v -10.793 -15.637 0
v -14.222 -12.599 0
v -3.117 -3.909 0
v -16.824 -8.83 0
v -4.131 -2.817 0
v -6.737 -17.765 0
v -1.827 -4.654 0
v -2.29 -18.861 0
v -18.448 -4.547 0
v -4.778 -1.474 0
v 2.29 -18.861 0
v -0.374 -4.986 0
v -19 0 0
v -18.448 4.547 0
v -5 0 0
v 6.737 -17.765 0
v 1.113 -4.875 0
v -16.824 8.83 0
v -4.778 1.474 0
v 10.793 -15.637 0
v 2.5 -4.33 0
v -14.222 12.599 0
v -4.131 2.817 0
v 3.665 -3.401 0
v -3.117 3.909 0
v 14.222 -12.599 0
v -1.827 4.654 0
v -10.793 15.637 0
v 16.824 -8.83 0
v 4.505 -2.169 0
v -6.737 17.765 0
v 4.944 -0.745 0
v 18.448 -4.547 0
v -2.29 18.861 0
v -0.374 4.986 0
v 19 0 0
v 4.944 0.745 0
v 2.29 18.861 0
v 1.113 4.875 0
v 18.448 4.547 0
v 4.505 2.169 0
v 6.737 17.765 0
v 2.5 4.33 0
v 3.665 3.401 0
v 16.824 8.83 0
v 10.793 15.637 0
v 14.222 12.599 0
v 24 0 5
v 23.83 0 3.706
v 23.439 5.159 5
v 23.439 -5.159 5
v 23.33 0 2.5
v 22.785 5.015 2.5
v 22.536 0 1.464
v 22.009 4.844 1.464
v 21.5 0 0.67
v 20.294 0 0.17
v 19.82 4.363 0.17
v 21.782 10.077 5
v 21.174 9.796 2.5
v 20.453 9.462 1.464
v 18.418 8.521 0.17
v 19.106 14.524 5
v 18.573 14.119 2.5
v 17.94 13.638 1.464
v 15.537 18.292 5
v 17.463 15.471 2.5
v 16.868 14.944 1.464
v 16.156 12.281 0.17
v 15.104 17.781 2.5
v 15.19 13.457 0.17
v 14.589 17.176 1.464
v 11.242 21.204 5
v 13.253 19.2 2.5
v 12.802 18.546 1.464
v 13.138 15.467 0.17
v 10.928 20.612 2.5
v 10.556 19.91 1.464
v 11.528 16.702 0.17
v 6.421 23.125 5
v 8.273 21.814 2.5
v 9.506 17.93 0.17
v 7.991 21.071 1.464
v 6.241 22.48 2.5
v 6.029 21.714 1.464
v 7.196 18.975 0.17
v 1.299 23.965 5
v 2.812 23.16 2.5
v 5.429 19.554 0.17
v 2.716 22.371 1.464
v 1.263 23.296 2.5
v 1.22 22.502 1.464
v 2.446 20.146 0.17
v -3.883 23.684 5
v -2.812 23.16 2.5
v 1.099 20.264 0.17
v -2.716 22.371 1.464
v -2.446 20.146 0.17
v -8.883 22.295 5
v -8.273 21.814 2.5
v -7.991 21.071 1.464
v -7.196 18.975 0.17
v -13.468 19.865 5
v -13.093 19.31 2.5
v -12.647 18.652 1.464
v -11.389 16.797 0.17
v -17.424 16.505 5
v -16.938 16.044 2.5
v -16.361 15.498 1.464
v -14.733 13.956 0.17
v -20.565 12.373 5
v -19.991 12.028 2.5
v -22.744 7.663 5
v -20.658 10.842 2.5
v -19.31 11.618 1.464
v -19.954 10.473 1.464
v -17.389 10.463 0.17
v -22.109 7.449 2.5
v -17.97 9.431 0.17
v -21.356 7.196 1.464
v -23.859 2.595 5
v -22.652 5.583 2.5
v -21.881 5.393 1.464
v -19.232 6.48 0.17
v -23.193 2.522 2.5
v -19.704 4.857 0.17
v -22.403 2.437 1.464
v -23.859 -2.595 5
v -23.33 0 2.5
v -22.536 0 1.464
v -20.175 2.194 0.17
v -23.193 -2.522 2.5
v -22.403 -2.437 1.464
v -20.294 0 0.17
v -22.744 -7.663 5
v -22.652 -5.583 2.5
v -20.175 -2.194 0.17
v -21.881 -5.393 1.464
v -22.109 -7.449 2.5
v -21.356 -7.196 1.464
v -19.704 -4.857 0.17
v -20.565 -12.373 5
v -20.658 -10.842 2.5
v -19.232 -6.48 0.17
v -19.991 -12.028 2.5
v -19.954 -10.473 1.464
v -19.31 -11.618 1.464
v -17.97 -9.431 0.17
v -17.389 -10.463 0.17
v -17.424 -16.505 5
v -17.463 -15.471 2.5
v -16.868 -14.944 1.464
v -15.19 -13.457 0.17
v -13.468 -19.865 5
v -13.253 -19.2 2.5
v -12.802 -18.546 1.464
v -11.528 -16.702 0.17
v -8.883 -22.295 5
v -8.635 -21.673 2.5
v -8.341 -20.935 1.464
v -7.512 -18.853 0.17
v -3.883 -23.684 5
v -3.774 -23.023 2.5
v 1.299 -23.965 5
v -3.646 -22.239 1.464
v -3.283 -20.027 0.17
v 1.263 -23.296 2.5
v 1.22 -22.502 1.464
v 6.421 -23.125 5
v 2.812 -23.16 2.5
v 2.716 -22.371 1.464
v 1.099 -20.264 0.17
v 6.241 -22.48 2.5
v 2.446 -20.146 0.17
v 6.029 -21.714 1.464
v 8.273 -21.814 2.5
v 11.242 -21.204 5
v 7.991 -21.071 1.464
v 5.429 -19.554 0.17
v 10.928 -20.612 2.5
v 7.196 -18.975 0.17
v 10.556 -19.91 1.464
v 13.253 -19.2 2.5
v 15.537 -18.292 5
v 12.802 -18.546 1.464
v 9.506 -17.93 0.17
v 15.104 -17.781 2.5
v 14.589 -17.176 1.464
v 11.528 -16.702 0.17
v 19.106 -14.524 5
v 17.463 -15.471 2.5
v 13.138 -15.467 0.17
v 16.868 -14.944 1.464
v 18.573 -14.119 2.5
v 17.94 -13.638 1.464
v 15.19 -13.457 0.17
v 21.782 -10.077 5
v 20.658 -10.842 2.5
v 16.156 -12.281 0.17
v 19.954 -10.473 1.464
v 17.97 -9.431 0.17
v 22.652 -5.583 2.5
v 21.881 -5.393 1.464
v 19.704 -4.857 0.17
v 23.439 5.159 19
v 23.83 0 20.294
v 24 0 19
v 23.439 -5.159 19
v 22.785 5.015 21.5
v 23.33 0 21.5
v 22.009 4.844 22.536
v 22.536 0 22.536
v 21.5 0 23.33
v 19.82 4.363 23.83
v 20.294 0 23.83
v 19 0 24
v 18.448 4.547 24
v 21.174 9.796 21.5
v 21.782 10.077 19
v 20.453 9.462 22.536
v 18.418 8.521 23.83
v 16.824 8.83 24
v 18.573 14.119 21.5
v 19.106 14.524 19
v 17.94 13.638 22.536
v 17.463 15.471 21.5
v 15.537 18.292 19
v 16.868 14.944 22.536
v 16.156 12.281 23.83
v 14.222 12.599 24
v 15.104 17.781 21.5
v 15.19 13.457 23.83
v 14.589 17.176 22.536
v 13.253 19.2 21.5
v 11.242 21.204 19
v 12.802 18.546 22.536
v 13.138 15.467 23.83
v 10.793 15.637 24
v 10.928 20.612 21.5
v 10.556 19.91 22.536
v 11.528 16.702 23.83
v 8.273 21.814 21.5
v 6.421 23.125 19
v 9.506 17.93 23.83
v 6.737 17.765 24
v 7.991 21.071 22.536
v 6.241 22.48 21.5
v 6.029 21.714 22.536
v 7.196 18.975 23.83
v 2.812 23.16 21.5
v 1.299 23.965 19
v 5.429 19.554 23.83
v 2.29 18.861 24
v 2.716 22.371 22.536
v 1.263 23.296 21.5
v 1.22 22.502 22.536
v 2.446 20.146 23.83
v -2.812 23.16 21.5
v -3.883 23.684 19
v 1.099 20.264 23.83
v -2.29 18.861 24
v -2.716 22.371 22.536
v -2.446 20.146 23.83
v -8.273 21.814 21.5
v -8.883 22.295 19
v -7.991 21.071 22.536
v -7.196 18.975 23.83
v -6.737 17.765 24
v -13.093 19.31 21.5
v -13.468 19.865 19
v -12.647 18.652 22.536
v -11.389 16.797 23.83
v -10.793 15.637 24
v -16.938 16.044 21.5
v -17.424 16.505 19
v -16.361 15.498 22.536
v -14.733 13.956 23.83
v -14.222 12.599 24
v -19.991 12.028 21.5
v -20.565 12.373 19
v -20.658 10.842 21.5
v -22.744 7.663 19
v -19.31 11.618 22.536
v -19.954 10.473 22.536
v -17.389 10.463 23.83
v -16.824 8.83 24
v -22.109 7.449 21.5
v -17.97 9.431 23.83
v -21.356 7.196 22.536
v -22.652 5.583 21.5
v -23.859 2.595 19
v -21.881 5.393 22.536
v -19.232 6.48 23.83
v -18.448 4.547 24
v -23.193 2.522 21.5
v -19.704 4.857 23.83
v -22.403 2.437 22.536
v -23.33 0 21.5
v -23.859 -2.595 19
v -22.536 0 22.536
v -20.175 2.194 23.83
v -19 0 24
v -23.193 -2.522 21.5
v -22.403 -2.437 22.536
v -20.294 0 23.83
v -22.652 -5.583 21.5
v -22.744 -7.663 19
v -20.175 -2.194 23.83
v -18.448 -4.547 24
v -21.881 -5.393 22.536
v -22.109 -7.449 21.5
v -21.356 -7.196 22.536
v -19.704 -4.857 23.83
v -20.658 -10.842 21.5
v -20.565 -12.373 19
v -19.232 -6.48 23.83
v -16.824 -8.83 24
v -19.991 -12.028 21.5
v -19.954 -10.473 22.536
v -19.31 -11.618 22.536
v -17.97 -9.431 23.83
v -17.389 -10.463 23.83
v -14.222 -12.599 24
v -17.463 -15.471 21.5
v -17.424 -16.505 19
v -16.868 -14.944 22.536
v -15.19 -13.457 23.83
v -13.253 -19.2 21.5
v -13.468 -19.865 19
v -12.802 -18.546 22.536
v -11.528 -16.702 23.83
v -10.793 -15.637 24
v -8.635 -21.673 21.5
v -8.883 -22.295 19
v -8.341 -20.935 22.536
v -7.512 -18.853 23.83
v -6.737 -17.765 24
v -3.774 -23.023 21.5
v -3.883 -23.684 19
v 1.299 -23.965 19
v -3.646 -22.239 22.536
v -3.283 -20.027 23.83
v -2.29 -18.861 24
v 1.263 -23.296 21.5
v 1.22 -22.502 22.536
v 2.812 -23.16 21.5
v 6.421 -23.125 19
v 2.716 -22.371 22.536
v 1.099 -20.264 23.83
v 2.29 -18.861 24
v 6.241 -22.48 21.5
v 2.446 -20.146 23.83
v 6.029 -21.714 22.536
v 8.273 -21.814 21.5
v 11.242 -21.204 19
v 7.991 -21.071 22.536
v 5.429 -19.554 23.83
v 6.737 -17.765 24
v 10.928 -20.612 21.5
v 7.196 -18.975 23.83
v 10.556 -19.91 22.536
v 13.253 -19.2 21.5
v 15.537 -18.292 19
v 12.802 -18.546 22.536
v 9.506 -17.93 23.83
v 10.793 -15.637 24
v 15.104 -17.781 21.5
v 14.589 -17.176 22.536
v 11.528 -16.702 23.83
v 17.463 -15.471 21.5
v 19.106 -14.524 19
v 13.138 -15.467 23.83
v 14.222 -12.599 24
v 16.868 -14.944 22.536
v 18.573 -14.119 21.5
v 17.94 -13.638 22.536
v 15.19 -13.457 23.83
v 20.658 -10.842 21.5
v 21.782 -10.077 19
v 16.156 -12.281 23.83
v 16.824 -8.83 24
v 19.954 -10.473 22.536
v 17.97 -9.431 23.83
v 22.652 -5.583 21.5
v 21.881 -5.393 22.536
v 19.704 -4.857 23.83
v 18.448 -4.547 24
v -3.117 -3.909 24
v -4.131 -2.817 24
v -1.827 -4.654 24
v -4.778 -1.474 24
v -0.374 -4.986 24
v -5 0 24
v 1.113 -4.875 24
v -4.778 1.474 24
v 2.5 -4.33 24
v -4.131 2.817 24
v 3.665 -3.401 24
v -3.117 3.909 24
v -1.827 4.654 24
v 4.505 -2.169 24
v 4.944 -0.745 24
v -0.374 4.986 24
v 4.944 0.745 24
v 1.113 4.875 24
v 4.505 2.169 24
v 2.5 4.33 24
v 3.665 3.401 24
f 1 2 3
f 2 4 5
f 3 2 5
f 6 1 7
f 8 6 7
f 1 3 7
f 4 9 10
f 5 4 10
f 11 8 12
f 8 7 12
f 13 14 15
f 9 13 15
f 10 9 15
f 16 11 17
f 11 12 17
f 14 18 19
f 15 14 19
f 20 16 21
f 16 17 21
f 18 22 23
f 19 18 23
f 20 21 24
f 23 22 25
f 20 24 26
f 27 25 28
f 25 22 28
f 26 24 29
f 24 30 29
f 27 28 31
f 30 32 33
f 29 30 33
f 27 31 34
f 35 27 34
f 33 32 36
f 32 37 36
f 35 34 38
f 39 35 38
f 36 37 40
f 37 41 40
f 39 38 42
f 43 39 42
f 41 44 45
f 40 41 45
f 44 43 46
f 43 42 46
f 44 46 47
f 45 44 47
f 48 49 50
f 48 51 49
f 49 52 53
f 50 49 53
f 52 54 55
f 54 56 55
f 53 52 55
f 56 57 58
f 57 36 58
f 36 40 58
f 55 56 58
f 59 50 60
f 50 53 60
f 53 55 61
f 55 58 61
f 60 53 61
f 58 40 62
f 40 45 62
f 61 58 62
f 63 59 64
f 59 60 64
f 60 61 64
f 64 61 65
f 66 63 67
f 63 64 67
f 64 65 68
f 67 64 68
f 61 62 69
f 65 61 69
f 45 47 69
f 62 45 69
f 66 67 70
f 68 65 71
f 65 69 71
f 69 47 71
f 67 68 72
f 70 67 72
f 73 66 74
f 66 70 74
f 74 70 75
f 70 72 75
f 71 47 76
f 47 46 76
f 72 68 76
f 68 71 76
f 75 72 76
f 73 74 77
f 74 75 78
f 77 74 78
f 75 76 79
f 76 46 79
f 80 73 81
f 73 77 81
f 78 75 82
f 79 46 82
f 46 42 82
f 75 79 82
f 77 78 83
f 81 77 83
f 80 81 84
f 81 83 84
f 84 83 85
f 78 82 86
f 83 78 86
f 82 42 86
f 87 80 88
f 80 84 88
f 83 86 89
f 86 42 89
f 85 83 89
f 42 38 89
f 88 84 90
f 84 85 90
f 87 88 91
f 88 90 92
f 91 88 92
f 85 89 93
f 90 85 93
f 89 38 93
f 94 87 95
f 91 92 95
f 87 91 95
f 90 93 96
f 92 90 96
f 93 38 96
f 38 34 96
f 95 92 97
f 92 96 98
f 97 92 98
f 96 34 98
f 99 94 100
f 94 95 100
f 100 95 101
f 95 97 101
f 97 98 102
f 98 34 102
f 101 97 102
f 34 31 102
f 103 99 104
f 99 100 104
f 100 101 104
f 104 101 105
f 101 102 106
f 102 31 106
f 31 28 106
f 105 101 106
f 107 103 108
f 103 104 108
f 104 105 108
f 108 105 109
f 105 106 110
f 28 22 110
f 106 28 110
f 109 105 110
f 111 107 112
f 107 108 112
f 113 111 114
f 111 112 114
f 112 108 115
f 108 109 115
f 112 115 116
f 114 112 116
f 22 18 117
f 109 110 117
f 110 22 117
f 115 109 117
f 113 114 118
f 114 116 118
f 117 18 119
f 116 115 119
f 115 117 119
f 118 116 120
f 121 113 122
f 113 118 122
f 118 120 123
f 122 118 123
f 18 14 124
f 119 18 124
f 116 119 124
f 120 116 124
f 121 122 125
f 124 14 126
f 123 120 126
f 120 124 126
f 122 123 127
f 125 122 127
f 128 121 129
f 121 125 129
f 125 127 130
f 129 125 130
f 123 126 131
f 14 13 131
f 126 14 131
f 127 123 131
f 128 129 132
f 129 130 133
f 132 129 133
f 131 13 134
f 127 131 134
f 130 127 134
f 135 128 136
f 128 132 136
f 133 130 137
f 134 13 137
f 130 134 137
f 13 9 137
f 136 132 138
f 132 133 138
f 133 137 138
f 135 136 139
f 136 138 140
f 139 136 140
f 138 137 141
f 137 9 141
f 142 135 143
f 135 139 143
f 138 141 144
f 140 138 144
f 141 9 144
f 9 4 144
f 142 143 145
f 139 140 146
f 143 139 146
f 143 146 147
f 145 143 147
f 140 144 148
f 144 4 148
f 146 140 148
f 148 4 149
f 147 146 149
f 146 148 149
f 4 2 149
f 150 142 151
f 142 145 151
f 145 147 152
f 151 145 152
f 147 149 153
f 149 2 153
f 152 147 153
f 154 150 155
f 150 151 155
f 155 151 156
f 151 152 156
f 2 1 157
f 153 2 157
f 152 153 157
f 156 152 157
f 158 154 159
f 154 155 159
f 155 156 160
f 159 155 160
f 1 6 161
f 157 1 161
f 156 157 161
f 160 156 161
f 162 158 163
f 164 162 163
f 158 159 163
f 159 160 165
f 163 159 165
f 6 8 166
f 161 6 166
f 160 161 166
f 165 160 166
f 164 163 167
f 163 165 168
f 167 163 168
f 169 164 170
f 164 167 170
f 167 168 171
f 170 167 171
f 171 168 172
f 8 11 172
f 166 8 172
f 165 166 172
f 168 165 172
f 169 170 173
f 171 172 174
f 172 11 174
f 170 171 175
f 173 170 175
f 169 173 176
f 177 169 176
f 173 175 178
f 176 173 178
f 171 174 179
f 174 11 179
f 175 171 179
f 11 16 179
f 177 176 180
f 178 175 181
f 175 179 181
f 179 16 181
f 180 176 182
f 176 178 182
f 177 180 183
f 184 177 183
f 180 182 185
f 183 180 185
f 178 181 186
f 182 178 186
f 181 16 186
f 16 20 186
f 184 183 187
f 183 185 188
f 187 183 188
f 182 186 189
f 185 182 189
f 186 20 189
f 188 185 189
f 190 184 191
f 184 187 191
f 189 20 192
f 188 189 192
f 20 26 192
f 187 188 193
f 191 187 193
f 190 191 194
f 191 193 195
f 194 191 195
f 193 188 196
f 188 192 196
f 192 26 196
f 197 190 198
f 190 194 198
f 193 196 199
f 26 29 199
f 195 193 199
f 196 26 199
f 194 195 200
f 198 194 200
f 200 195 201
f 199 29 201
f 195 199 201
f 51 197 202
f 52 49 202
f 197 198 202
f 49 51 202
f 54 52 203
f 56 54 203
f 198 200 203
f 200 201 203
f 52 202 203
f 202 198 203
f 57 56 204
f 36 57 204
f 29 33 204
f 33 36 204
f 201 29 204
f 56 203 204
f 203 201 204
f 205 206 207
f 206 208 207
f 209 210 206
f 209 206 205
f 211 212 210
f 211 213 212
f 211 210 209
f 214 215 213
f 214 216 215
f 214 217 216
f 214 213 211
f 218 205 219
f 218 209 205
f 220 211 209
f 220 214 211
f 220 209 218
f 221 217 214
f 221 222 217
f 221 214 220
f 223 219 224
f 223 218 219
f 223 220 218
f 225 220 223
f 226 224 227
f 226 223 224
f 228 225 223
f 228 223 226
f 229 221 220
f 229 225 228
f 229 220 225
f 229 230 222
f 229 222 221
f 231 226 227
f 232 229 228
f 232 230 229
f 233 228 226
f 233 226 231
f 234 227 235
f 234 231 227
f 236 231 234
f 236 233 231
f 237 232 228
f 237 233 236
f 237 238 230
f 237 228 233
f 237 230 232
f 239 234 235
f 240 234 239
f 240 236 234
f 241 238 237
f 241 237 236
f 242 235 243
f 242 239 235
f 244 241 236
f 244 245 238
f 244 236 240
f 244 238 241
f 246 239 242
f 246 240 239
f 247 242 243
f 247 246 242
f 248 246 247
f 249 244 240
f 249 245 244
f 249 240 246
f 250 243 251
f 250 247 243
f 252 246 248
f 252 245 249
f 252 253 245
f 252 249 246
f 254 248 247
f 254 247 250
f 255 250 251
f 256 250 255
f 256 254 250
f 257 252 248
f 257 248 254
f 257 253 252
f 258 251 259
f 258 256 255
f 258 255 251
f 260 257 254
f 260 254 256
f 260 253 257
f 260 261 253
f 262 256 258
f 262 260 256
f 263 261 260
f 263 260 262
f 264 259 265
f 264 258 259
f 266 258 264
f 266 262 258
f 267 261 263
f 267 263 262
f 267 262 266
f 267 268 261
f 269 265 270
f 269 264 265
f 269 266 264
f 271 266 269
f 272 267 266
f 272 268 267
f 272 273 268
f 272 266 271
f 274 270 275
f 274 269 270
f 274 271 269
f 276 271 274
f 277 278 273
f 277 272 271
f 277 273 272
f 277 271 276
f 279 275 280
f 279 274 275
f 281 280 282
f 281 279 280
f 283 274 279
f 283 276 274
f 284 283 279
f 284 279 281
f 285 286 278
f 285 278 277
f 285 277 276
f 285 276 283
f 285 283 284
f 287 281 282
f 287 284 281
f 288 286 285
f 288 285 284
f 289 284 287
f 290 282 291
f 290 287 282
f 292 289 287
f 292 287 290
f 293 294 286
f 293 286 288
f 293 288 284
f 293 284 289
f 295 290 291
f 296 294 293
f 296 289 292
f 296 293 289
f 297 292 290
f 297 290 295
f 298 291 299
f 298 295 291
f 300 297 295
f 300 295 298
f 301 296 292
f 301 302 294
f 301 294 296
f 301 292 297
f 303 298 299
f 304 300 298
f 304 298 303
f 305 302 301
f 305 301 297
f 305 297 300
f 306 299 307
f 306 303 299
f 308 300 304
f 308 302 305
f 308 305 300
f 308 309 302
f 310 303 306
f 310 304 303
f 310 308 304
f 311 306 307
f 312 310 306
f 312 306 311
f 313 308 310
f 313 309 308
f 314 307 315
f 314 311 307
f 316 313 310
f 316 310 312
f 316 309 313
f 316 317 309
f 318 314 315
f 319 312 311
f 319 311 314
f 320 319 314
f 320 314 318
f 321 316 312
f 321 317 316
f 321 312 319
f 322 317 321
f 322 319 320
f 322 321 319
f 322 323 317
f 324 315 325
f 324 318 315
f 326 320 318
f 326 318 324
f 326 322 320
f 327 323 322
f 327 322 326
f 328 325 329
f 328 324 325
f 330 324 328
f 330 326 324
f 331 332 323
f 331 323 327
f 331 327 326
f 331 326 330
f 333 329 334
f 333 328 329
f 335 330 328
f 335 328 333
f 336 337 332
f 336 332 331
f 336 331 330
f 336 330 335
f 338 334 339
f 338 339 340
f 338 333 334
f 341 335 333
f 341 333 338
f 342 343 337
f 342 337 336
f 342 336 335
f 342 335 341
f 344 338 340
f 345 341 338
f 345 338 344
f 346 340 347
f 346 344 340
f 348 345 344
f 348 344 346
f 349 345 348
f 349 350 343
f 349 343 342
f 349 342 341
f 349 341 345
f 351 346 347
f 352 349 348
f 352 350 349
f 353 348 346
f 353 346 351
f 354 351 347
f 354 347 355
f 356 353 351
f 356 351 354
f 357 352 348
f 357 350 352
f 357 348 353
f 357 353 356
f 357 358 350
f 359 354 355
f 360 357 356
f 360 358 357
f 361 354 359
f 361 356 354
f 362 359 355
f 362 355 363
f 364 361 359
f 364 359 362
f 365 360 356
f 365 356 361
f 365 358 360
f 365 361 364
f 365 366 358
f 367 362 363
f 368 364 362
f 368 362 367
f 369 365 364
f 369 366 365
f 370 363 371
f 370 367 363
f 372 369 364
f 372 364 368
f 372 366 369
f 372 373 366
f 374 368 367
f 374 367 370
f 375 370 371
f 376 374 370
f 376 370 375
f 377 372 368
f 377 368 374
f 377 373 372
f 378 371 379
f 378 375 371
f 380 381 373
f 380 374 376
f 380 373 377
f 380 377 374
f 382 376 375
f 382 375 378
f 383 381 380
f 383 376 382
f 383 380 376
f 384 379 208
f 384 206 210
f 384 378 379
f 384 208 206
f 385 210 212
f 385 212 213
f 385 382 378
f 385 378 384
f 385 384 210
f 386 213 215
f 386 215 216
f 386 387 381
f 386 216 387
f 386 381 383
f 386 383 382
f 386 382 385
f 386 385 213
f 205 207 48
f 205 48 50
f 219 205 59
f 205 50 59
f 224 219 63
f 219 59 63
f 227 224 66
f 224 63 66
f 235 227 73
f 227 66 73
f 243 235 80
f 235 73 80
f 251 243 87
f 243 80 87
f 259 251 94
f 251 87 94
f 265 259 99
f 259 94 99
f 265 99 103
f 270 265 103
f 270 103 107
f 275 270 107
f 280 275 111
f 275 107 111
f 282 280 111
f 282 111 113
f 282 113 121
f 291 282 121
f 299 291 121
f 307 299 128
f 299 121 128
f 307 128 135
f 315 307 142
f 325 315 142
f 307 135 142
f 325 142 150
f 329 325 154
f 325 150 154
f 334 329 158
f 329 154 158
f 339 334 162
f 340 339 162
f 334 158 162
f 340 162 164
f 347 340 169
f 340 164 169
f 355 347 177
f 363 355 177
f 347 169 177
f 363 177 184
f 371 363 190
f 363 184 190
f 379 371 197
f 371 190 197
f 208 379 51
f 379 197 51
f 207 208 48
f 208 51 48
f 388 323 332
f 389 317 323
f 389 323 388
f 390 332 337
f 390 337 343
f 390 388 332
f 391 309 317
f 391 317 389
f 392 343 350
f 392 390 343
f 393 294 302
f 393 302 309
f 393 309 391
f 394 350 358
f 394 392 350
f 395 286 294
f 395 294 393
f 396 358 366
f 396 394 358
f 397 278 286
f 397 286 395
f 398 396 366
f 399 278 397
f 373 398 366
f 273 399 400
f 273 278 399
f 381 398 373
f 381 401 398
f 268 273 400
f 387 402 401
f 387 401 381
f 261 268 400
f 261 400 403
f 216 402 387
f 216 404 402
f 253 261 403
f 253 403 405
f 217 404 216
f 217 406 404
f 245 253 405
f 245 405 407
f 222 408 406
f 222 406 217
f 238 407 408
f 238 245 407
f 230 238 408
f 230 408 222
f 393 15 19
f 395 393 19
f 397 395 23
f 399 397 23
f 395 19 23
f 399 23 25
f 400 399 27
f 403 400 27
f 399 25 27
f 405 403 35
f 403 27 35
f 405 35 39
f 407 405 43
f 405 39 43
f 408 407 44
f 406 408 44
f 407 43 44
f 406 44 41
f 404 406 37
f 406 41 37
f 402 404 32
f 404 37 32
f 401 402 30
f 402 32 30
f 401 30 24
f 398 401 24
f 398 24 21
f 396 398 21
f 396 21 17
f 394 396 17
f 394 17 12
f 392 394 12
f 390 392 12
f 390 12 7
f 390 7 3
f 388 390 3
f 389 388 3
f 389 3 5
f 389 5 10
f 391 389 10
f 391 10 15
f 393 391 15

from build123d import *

# Parameters (mm, degrees)
SKIZZE1_R                       = 24
AUFSATZ_LINEAR_AUSTRAGEN1_DEPTH = 24
VERRUNDUNG1_R                   = 5
SKIZZE2_R                       = 5
SCHNITT_LINEAR_AUSTRAGEN1_DEPTH = 25


with BuildPart() as part:
    # Skizze1 → Aufsatz-Linear austragen1 (new body)
    with BuildSketch(Plane.XY):
        Circle(SKIZZE1_R)
    extrude(amount=AUFSATZ_LINEAR_AUSTRAGEN1_DEPTH)

    # Verrundung1
    verrundung1_edges = [part.edges().sort_by_distance(p)[0] for p in [
        (-24, 0, 0),
        (-24, 0, 24),
    ]]
    fillet(verrundung1_edges, radius=VERRUNDUNG1_R)

    # Skizze2 → Schnitt-Linear austragen1 (cut, through all)
    with BuildSketch(Plane(origin=(0, 0, 0), x_dir=(-1, 0, 0), z_dir=(0, 0, -1))):
        Circle(SKIZZE2_R)
    extrude(amount=-SCHNITT_LINEAR_AUSTRAGEN1_DEPTH, mode=Mode.SUBTRACT)


solid = part.part
